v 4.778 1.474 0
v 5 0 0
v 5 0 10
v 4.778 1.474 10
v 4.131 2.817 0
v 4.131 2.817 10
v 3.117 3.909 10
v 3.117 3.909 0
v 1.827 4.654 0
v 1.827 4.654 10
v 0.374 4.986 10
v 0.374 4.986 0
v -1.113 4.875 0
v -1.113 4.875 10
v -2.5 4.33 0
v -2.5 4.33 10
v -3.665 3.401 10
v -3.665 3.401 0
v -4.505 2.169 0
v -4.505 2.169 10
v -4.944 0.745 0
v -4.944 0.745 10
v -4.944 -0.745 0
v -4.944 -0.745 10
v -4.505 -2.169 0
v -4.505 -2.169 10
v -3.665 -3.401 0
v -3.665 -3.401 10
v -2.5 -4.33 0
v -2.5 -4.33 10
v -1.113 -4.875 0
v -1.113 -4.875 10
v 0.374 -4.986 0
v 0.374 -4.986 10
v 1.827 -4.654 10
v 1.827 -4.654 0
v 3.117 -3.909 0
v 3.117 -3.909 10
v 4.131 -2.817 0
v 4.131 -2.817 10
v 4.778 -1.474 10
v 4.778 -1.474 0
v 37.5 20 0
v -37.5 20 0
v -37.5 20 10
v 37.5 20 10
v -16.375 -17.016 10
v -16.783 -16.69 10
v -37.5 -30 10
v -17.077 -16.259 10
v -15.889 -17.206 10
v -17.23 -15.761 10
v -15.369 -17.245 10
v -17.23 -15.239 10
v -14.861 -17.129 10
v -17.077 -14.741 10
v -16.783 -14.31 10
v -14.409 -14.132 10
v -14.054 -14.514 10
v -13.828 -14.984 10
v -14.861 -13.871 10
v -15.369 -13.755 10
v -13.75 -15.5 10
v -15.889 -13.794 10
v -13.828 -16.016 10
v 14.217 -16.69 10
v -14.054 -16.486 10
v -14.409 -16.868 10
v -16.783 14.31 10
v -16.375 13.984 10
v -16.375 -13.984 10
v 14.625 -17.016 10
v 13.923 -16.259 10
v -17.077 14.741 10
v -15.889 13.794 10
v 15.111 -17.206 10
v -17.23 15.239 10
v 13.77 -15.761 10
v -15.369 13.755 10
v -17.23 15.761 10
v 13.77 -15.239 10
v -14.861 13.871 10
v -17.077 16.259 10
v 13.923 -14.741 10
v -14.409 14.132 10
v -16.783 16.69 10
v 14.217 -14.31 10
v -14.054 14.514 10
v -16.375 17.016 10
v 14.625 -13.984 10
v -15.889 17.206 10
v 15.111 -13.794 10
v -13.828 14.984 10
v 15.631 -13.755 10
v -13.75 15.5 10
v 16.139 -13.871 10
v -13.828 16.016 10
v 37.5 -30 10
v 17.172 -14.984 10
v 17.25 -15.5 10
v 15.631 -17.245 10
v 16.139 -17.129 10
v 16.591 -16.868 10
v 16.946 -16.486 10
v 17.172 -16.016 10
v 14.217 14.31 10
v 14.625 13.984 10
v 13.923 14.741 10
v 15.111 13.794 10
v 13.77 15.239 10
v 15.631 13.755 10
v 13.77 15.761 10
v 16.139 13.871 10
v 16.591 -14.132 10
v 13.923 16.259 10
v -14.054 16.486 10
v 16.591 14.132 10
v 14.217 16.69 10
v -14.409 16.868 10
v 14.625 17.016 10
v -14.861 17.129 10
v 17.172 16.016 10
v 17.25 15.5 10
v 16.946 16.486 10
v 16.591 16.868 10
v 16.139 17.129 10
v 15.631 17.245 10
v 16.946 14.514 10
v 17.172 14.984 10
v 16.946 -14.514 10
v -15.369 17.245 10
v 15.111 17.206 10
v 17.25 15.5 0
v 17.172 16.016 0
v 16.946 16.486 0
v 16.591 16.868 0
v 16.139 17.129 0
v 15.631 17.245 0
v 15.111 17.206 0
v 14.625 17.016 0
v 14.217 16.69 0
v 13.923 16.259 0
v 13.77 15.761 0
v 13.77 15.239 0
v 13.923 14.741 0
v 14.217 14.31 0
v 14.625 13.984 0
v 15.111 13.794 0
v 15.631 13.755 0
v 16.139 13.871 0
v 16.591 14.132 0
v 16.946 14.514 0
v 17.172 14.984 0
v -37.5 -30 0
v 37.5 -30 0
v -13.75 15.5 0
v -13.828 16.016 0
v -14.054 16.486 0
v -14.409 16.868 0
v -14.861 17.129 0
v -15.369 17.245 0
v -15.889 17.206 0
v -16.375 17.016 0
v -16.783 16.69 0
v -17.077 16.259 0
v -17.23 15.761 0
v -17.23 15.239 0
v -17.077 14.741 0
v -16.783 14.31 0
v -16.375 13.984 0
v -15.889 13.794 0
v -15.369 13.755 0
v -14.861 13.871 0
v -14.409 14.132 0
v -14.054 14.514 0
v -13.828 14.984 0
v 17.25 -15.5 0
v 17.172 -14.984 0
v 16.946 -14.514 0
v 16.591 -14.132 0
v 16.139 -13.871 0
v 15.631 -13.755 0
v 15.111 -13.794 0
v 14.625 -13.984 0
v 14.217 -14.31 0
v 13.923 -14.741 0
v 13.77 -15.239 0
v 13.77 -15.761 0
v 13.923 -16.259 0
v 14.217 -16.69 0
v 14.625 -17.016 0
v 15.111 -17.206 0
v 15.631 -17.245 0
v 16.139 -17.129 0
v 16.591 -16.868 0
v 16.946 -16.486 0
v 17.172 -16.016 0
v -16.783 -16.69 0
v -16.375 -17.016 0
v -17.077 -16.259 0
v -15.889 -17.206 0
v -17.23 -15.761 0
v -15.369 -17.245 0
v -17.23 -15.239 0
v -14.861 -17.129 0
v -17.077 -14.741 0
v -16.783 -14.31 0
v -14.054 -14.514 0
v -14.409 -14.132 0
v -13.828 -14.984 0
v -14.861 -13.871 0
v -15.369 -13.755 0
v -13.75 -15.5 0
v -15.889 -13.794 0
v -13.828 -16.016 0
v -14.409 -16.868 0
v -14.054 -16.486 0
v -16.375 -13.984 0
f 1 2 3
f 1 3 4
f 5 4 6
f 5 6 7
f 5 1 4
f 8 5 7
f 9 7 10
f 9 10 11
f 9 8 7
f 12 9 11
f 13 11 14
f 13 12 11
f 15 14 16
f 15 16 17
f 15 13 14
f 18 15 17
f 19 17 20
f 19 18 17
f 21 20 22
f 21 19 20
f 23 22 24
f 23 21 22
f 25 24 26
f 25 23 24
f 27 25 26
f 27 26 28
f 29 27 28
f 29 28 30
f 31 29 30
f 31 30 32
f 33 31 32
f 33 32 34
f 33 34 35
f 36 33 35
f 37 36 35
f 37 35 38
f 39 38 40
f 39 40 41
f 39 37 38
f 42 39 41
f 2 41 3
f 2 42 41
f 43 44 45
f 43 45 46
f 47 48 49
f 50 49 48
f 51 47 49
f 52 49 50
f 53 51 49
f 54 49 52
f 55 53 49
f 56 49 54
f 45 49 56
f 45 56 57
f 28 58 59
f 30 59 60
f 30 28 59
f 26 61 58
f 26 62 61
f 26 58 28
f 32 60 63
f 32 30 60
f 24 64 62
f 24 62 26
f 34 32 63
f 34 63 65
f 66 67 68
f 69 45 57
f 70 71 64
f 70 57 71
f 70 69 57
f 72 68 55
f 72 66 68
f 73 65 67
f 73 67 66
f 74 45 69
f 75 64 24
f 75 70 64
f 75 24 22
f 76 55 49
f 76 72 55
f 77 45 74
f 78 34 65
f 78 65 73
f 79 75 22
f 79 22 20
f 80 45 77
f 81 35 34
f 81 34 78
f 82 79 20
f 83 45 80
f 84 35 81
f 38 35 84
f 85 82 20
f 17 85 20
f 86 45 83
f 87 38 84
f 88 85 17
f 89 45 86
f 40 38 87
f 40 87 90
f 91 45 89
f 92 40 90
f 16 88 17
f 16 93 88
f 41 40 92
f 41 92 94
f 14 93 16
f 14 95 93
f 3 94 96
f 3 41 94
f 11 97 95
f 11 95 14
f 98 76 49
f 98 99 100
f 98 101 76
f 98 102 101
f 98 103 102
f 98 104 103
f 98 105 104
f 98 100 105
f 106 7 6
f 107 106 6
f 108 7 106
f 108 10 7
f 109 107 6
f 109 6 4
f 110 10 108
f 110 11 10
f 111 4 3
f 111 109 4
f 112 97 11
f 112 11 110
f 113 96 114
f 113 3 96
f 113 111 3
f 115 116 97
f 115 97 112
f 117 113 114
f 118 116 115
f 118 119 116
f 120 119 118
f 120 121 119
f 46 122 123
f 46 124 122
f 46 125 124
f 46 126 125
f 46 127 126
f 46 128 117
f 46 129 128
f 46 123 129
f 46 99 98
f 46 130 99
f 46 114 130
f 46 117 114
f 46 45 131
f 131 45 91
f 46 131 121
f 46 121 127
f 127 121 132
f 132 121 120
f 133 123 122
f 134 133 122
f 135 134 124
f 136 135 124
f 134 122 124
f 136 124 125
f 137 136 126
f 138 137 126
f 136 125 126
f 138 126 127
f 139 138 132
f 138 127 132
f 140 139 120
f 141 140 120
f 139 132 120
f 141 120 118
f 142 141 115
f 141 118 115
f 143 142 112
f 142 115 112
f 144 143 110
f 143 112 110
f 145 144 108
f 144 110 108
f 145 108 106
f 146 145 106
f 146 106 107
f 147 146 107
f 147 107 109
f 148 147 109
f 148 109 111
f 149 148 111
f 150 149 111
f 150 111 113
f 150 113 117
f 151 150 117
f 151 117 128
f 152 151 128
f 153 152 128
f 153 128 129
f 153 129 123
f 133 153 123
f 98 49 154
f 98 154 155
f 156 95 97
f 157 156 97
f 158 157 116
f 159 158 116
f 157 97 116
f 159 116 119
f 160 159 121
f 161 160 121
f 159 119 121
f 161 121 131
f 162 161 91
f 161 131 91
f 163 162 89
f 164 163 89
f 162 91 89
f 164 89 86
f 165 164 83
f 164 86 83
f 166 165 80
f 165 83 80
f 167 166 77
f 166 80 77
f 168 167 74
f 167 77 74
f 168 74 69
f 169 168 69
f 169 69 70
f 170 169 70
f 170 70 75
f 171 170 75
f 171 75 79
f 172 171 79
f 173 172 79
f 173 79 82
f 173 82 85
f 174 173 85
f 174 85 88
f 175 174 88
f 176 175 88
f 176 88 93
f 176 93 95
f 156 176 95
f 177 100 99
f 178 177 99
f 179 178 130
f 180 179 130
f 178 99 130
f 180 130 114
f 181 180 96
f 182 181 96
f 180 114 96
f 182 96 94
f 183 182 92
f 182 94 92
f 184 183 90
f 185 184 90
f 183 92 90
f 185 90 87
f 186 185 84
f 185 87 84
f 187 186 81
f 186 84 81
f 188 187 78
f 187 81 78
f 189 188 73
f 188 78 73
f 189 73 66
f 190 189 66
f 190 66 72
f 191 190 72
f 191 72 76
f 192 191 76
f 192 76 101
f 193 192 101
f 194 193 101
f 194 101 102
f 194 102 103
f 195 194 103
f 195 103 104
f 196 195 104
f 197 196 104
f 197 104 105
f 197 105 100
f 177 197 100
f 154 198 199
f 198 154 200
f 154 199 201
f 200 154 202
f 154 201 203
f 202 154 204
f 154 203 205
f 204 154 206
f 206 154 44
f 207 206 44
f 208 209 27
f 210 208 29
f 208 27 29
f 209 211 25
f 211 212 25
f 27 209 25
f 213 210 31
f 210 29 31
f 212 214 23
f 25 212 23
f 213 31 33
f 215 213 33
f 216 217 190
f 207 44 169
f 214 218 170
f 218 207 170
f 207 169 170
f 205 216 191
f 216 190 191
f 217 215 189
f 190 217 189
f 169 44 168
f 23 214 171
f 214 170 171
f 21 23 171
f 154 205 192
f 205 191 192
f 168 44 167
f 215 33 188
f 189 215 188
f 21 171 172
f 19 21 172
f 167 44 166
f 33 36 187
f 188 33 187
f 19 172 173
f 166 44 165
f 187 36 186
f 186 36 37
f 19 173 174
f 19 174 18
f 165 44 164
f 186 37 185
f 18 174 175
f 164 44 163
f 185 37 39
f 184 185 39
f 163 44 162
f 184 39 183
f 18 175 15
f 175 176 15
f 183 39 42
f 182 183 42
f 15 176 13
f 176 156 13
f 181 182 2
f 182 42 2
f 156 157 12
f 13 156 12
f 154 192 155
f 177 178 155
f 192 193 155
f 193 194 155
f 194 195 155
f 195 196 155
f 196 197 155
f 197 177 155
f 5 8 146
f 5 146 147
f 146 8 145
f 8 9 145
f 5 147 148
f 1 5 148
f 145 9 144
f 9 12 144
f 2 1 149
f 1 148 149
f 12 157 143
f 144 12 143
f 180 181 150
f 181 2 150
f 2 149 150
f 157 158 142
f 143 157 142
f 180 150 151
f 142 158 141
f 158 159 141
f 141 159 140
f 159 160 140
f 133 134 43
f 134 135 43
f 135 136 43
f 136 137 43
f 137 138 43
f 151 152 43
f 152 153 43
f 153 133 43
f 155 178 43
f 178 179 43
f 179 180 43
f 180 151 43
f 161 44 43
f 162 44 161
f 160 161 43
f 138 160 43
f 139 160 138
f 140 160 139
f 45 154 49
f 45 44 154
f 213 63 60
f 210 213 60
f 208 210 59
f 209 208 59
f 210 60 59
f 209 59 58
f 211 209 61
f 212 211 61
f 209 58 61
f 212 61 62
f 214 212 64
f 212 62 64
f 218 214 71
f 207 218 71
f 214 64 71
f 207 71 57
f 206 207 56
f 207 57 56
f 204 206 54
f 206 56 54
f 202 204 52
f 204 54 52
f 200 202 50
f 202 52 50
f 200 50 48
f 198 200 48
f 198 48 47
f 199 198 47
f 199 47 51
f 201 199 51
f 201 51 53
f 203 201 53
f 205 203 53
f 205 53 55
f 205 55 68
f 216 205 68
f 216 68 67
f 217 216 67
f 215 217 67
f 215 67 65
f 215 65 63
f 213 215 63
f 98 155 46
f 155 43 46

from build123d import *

# Parameters (mm, degrees)
SKETCH1_W                  = 75
SKETCH1_H                  = 40
SKETCH1_R                  = 5
BOSS_EXTRUDE1_DEPTH        = 10
F_3_5_3_5_DIAMETER_HOLE1_D = 3.5
SKETCH4_W                  = 75
SKETCH4_H                  = 10
BOSS_EXTRUDE2_DEPTH        = 10


with BuildPart() as part:
    # Sketch1 → Boss-Extrude1 (new body)
    with BuildSketch(Plane.XY):
        Rectangle(SKETCH1_W, SKETCH1_H)
        Circle(SKETCH1_R, mode=Mode.SUBTRACT)
    extrude(amount=BOSS_EXTRUDE1_DEPTH)

    # Ø3.5 (3.5) Diameter Hole1 (through all)
    with Locations(Plane(origin=(0, 0, 0), x_dir=(-1, 0, 0), z_dir=(0, 0, -1))):
        with Locations((15.5, 15.5), (-15.5, 15.5), (-15.5, -15.5), (15.5, -15.5)):
            Hole(F_3_5_3_5_DIAMETER_HOLE1_D / 2)

    # Sketch4 → Boss-Extrude2 (add)
    with BuildSketch(Plane.XZ.offset(20)):
        with Locations((0, 5)):
            Rectangle(SKETCH4_W, SKETCH4_H)
    extrude(amount=BOSS_EXTRUDE2_DEPTH)


solid = part.part
